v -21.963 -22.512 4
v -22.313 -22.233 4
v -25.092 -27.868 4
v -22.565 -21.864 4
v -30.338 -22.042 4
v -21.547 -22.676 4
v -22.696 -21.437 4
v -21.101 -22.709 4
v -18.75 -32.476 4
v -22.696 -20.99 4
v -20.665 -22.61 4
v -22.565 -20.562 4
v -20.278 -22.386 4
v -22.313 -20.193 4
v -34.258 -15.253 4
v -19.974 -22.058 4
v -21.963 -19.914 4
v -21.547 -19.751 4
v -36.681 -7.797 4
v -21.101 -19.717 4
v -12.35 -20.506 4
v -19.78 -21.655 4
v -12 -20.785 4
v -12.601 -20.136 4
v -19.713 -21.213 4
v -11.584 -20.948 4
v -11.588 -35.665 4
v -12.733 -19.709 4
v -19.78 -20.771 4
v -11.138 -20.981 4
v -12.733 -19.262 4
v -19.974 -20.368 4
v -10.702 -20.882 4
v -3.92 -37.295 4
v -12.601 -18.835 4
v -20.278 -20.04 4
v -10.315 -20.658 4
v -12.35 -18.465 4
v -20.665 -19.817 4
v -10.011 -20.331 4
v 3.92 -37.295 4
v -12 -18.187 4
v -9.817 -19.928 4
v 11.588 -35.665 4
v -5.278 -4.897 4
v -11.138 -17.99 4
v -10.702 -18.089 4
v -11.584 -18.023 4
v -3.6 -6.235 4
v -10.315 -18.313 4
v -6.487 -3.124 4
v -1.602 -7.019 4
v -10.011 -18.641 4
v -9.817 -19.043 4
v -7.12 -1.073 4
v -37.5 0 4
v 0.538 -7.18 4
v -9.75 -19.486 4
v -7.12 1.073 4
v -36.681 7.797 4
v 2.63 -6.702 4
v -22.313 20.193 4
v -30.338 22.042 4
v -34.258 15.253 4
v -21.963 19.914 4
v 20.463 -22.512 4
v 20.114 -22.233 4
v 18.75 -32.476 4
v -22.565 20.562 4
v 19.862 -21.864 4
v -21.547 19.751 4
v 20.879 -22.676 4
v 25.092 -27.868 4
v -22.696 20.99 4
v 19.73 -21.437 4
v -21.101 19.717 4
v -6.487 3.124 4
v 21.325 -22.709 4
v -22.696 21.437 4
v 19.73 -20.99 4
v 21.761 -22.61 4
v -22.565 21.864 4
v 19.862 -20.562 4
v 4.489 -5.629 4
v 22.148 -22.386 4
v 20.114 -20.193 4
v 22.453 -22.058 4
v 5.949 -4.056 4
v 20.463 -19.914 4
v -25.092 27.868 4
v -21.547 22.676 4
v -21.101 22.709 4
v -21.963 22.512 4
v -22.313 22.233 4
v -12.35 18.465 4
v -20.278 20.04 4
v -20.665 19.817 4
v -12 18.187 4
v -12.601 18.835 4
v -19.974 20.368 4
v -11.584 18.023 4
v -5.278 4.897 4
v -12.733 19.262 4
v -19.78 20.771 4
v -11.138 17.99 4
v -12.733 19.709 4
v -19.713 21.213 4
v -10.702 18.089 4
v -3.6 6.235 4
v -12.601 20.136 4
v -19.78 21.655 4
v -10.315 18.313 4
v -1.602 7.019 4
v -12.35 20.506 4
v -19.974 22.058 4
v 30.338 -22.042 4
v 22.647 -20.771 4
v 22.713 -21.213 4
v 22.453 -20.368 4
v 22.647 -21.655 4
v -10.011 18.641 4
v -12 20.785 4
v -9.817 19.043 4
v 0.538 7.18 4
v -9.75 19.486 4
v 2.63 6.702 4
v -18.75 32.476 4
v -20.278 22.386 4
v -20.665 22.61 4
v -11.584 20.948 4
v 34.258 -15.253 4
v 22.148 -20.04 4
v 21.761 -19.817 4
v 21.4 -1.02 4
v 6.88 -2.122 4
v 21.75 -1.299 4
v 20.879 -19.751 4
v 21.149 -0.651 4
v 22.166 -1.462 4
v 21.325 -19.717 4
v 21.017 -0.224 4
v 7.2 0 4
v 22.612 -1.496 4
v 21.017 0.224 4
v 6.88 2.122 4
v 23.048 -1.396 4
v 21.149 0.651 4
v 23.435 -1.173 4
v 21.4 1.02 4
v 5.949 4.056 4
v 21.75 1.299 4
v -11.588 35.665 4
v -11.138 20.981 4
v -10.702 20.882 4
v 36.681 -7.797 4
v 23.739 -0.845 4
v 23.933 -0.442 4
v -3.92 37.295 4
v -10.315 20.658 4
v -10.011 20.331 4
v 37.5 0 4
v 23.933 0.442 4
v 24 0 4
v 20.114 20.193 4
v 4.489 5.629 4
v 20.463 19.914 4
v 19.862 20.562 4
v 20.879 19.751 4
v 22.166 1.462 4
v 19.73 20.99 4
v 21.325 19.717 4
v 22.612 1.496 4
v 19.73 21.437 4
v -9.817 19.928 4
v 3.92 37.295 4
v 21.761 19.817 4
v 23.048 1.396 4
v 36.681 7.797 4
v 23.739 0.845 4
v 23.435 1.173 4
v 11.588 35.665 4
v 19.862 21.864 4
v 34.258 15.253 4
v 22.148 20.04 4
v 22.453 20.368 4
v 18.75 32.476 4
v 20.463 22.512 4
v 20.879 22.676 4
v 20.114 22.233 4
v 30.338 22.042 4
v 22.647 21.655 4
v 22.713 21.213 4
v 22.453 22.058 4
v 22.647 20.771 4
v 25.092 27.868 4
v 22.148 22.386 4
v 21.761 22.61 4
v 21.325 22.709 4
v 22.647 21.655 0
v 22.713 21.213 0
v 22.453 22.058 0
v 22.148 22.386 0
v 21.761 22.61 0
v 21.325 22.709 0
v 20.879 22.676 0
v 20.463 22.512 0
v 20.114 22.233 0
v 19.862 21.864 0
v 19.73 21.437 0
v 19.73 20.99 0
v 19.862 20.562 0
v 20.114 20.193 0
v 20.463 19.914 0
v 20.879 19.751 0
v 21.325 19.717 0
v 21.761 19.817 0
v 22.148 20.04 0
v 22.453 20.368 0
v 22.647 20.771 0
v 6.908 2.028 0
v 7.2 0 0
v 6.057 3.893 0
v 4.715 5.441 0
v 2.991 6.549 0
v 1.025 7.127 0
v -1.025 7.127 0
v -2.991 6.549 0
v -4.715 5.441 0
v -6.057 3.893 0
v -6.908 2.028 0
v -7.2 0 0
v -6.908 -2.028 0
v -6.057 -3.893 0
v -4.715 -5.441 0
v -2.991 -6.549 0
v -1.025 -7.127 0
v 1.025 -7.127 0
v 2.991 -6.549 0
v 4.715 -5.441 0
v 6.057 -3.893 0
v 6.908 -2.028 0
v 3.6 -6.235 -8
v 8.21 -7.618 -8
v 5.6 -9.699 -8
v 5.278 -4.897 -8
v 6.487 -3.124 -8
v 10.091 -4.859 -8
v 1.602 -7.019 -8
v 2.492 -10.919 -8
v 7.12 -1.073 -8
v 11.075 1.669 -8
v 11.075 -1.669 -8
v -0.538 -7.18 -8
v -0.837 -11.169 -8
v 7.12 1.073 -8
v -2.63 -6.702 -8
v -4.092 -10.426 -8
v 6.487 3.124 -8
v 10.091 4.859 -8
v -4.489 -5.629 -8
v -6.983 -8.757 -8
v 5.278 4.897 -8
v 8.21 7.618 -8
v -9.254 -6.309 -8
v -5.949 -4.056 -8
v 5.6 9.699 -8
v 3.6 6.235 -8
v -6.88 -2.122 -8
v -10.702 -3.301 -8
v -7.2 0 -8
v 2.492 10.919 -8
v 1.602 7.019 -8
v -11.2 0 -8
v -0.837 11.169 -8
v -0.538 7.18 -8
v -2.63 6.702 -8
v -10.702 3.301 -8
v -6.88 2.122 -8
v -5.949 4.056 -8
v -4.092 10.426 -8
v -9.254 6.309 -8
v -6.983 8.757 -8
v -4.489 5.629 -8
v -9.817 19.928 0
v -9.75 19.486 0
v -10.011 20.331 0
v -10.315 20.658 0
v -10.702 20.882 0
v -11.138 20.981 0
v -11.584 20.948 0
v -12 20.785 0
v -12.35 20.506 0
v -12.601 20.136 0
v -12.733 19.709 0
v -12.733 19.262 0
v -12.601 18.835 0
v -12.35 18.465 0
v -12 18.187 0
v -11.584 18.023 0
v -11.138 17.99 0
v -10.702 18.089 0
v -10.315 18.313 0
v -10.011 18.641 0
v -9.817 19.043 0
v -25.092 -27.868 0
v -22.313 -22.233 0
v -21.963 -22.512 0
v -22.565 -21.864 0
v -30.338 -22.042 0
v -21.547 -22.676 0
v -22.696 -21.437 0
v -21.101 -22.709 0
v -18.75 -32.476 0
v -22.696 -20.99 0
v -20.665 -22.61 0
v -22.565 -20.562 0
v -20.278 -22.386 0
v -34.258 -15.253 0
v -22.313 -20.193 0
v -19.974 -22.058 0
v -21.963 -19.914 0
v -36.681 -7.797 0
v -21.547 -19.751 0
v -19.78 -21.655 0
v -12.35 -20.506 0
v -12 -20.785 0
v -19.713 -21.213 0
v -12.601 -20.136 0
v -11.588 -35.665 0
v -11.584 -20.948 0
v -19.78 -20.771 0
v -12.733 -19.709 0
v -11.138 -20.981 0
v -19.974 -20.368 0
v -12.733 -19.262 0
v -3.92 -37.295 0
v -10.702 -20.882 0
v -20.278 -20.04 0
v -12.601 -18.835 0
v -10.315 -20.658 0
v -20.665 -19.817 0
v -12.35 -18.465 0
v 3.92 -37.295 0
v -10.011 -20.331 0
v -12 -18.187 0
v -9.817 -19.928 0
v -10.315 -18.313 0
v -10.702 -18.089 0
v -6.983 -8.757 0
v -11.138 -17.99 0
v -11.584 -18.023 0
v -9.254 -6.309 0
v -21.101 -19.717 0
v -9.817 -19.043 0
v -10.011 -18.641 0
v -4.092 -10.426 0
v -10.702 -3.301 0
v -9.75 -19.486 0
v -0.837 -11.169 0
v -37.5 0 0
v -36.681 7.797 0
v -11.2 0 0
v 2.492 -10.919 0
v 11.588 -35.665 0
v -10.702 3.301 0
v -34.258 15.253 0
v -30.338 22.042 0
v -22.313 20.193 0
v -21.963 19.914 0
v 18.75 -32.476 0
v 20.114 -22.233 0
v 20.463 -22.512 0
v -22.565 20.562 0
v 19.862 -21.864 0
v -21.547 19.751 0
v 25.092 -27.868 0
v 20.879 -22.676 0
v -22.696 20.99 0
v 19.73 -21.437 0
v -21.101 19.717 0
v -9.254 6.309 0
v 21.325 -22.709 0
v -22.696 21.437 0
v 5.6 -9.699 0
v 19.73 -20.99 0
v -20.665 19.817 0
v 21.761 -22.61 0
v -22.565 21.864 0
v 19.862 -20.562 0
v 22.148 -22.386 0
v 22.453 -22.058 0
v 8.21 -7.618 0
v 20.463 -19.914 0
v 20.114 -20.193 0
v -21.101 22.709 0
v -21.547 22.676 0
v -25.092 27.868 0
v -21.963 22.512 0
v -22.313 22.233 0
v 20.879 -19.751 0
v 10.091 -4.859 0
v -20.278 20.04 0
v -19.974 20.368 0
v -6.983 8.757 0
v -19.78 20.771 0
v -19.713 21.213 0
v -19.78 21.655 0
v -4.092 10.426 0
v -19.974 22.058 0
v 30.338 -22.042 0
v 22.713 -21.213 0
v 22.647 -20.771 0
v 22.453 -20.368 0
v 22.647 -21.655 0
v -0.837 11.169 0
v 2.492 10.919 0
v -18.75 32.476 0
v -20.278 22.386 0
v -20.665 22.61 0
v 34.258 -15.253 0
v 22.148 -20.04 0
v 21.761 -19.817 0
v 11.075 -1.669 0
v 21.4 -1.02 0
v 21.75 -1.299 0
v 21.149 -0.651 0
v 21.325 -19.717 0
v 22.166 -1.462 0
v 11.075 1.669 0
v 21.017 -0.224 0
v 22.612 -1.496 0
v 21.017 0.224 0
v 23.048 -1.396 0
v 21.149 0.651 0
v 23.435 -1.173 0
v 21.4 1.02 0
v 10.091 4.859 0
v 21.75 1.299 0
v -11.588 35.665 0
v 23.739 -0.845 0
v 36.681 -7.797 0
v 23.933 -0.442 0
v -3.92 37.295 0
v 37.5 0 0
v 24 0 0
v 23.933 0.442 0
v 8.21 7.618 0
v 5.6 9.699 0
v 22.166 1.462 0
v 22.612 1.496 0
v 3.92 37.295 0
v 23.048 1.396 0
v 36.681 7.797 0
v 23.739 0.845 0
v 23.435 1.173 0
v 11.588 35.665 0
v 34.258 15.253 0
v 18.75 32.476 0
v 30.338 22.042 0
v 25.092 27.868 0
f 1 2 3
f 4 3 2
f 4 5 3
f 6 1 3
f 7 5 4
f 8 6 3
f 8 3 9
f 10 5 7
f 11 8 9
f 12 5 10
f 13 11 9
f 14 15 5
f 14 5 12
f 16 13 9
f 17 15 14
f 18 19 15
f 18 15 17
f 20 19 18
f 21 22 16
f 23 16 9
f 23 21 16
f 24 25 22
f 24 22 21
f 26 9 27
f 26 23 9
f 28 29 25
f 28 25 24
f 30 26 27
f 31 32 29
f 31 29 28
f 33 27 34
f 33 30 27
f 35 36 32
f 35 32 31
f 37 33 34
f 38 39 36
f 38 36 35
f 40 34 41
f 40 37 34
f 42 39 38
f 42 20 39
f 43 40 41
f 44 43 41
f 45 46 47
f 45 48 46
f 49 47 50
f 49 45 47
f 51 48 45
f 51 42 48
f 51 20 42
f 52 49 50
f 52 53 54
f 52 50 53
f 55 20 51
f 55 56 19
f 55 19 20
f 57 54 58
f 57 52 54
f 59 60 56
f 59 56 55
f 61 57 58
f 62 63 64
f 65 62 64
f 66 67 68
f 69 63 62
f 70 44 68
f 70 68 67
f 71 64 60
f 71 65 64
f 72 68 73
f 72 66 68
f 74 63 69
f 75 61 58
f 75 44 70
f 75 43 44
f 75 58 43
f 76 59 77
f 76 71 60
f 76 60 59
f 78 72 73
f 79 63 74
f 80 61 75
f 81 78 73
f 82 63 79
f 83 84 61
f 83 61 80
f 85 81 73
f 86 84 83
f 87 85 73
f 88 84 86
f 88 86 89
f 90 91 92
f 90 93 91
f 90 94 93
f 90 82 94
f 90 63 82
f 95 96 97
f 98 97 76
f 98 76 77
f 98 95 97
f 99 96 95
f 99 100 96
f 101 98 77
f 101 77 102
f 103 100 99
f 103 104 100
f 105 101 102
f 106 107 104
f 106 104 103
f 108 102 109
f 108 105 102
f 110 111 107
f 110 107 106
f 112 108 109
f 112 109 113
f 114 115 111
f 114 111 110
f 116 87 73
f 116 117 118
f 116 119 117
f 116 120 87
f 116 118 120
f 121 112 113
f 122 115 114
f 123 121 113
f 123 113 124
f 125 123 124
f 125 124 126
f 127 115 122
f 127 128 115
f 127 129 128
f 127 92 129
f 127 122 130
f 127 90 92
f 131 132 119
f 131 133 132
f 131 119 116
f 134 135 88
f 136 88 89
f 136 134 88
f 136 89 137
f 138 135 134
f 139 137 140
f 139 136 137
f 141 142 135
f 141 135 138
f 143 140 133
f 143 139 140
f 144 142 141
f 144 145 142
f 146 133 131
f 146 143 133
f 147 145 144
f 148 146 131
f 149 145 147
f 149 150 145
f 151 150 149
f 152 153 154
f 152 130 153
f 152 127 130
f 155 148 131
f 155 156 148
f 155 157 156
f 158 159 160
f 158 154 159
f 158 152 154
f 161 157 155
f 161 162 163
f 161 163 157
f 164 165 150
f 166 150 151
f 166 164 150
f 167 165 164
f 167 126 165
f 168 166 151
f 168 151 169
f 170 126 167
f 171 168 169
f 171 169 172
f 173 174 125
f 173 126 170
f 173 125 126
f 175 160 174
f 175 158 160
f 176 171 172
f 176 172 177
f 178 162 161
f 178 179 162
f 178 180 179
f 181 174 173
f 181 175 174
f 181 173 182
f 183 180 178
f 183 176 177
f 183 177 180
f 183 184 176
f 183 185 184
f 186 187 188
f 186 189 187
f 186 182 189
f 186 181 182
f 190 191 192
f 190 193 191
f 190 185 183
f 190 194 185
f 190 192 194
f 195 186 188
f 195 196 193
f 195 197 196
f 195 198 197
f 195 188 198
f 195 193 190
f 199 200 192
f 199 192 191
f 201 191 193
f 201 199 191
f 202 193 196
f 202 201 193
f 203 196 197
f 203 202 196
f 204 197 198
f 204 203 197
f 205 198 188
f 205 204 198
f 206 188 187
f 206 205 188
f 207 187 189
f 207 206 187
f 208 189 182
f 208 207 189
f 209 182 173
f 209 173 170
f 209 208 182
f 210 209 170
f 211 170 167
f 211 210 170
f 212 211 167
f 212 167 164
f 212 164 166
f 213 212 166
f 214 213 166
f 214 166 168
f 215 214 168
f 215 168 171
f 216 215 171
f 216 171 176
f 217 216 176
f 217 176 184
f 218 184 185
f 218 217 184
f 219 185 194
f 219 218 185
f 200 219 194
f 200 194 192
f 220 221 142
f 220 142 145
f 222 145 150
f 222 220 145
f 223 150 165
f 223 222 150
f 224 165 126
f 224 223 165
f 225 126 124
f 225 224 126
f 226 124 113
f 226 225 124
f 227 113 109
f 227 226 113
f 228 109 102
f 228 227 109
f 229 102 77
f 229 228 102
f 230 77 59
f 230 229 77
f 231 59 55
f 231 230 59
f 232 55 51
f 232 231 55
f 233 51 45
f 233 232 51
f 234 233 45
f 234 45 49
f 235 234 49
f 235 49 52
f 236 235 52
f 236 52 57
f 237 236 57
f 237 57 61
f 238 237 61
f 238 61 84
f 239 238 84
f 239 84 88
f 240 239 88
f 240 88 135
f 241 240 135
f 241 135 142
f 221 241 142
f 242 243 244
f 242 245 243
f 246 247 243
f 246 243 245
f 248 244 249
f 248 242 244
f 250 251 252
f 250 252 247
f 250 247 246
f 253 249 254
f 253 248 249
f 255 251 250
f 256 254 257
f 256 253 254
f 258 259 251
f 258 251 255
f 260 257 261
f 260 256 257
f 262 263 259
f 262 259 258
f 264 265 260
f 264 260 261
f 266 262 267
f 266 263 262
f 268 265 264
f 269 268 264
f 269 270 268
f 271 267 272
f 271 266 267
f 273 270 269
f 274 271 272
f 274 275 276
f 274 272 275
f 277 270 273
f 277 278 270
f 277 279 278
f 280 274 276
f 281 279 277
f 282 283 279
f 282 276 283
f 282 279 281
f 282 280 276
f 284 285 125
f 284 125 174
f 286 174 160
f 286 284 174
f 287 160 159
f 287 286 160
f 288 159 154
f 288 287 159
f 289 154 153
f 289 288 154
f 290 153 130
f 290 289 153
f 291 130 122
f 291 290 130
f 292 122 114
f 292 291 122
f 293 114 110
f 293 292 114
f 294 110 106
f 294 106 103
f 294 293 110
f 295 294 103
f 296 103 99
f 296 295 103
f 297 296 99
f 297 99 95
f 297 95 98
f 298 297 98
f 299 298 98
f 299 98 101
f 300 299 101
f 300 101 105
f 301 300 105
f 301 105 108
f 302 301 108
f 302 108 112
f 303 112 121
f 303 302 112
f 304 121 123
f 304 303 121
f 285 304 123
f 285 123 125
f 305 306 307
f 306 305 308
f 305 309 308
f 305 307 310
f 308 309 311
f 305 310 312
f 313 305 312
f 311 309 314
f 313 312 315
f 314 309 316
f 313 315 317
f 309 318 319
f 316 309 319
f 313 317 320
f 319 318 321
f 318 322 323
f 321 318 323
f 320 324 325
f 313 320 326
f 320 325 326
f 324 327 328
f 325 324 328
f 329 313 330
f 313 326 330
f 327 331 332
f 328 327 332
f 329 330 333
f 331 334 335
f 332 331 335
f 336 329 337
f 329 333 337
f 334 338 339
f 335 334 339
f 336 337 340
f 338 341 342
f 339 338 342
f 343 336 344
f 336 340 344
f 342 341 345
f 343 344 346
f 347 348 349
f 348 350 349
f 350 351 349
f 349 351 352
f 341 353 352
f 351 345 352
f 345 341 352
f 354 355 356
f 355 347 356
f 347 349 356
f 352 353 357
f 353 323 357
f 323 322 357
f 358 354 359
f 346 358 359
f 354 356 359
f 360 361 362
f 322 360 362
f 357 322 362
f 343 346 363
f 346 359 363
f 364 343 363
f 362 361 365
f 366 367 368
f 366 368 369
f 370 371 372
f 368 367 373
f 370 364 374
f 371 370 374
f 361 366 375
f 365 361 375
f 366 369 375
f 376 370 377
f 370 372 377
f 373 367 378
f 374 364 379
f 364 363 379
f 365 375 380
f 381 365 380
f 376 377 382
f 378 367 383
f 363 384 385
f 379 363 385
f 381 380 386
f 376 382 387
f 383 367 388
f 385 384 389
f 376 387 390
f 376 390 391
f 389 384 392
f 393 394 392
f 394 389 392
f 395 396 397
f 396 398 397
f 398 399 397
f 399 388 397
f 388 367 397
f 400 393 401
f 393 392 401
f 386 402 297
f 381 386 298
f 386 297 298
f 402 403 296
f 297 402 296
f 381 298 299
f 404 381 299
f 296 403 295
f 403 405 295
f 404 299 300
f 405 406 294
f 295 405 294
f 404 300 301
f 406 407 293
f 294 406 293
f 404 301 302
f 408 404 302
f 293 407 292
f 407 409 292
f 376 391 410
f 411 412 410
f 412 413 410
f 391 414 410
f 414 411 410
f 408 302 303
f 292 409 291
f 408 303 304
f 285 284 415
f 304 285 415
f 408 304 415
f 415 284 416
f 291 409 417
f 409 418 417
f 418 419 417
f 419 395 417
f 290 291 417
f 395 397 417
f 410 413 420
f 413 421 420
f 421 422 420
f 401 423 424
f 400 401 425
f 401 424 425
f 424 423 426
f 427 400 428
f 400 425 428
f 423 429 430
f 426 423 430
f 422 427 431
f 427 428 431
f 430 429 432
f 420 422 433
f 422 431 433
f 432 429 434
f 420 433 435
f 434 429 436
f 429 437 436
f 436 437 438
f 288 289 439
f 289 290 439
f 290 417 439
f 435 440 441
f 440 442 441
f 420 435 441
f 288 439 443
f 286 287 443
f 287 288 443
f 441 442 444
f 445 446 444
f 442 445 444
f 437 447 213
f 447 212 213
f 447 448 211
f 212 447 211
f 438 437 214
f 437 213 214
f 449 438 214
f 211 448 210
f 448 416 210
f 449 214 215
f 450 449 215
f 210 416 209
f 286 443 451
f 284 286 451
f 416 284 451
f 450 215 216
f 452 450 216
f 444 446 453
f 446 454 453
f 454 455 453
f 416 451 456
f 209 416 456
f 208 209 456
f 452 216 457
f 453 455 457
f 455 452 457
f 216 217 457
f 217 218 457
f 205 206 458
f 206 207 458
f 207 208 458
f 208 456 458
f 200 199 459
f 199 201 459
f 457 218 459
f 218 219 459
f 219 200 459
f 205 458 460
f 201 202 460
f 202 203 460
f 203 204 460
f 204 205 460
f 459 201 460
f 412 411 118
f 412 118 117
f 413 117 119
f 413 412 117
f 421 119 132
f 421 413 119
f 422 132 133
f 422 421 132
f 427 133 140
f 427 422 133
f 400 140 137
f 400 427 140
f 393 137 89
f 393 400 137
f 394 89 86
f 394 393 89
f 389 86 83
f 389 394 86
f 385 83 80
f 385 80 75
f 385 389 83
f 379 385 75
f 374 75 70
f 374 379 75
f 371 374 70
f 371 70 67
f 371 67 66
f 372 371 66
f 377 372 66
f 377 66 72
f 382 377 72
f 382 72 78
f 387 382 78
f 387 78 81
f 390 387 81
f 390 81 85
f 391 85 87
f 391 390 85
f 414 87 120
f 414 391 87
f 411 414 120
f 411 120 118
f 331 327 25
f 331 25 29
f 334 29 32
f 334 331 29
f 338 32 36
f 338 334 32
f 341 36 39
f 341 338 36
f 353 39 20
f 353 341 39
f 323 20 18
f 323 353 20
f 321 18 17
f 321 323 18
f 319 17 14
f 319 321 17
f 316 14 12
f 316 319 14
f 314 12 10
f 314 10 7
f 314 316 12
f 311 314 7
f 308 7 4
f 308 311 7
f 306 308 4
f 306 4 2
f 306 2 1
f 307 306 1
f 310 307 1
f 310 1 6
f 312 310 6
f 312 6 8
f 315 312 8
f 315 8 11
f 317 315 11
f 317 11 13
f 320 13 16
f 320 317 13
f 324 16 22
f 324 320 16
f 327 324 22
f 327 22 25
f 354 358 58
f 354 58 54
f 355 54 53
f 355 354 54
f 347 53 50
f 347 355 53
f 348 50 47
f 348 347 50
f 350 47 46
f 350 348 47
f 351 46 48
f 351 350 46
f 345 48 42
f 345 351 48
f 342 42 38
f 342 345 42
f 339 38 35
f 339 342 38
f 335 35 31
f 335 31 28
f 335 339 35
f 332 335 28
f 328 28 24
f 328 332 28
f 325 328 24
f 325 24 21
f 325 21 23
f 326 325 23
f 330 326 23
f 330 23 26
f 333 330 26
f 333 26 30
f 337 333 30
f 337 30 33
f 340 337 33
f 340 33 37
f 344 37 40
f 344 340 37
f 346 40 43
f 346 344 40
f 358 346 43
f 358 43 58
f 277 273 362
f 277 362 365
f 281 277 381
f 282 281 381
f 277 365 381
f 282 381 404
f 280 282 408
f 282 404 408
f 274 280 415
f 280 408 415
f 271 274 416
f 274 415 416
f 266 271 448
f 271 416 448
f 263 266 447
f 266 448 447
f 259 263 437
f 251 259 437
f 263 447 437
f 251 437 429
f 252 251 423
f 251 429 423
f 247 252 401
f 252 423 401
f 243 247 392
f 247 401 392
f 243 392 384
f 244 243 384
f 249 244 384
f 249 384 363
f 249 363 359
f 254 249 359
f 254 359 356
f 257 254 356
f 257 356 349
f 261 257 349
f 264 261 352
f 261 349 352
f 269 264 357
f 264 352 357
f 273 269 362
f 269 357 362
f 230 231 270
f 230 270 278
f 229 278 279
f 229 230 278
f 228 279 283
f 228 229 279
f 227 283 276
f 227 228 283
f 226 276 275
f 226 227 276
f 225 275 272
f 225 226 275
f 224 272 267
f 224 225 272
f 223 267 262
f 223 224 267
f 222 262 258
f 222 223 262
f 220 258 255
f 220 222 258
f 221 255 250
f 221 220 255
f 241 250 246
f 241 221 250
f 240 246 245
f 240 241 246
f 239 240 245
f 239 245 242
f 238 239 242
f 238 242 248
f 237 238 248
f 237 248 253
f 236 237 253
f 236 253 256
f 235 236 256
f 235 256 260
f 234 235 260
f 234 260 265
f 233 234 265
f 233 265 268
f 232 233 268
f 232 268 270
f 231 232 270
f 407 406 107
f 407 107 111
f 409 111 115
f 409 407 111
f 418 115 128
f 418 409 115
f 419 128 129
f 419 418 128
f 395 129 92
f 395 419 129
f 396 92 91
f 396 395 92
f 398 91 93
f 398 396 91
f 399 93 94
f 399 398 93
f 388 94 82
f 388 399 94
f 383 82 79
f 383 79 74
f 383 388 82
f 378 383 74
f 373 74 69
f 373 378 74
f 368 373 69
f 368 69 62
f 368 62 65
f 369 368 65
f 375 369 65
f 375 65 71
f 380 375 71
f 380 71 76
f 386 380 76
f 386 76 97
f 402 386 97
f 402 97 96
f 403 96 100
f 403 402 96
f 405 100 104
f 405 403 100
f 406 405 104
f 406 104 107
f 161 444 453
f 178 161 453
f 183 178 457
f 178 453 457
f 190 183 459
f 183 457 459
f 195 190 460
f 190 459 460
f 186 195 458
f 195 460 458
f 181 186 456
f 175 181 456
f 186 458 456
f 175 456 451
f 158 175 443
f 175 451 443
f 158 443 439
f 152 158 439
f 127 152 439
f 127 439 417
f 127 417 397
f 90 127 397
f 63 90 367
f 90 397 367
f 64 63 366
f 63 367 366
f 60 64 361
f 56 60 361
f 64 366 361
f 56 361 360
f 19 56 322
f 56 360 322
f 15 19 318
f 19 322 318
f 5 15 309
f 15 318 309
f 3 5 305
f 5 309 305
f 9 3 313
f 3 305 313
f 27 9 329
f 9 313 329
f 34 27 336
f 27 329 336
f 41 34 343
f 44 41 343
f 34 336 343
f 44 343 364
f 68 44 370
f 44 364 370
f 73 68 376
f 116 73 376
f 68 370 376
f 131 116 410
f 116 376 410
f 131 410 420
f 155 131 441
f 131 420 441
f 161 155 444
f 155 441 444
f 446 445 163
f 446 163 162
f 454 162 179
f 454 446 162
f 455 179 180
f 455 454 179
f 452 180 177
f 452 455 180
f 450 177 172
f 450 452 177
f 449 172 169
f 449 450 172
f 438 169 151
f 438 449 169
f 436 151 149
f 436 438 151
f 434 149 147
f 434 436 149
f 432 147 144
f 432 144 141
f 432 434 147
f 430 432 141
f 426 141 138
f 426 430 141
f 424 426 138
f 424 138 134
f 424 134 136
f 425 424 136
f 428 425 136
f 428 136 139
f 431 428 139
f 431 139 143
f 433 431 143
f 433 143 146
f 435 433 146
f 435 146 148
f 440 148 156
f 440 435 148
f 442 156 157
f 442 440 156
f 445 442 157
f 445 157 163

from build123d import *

# Parameters (mm, degrees)
SKETCH1_R           = 37.5
SKETCH1_R_2         = 7.2
SKETCH1_R_3         = 1.5
BOSS_EXTRUDE1_DEPTH = 4
SKETCH2_R           = 11.2
SKETCH2_R_2         = 7.2
BOSS_EXTRUDE2_DEPTH = 8


with BuildPart() as part:
    # Sketch1 → Boss-Extrude1 (new body)
    with BuildSketch(Plane.XY):
        Circle(SKETCH1_R)
        Circle(SKETCH1_R_2, mode=Mode.SUBTRACT)
        with Locations((22.5, 0)):
            Circle(SKETCH1_R_3, mode=Mode.SUBTRACT)
        with Locations((-11.25, -19.485571585)):
            Circle(SKETCH1_R_3, mode=Mode.SUBTRACT)
        with Locations((-11.25, 19.485571585)):
            Circle(SKETCH1_R_3, mode=Mode.SUBTRACT)
        with Locations((21.213203436, 21.213203436)):
            Circle(SKETCH1_R_3, mode=Mode.SUBTRACT)
        with Locations((21.213203436, -21.213203436)):
            Circle(SKETCH1_R_3, mode=Mode.SUBTRACT)
        with Locations((-21.213203436, -21.213203436)):
            Circle(SKETCH1_R_3, mode=Mode.SUBTRACT)
        with Locations((-21.213203436, 21.213203436)):
            Circle(SKETCH1_R_3, mode=Mode.SUBTRACT)
    extrude(amount=BOSS_EXTRUDE1_DEPTH)

    # Sketch2 → Boss-Extrude2 (add)
    with BuildSketch(Plane(origin=(0, 0, 0), x_dir=(-1, 0, 0), z_dir=(0, 0, -1))):
        Circle(SKETCH2_R)
        Circle(SKETCH2_R_2, mode=Mode.SUBTRACT)
    extrude(amount=BOSS_EXTRUDE2_DEPTH)


solid = part.part
